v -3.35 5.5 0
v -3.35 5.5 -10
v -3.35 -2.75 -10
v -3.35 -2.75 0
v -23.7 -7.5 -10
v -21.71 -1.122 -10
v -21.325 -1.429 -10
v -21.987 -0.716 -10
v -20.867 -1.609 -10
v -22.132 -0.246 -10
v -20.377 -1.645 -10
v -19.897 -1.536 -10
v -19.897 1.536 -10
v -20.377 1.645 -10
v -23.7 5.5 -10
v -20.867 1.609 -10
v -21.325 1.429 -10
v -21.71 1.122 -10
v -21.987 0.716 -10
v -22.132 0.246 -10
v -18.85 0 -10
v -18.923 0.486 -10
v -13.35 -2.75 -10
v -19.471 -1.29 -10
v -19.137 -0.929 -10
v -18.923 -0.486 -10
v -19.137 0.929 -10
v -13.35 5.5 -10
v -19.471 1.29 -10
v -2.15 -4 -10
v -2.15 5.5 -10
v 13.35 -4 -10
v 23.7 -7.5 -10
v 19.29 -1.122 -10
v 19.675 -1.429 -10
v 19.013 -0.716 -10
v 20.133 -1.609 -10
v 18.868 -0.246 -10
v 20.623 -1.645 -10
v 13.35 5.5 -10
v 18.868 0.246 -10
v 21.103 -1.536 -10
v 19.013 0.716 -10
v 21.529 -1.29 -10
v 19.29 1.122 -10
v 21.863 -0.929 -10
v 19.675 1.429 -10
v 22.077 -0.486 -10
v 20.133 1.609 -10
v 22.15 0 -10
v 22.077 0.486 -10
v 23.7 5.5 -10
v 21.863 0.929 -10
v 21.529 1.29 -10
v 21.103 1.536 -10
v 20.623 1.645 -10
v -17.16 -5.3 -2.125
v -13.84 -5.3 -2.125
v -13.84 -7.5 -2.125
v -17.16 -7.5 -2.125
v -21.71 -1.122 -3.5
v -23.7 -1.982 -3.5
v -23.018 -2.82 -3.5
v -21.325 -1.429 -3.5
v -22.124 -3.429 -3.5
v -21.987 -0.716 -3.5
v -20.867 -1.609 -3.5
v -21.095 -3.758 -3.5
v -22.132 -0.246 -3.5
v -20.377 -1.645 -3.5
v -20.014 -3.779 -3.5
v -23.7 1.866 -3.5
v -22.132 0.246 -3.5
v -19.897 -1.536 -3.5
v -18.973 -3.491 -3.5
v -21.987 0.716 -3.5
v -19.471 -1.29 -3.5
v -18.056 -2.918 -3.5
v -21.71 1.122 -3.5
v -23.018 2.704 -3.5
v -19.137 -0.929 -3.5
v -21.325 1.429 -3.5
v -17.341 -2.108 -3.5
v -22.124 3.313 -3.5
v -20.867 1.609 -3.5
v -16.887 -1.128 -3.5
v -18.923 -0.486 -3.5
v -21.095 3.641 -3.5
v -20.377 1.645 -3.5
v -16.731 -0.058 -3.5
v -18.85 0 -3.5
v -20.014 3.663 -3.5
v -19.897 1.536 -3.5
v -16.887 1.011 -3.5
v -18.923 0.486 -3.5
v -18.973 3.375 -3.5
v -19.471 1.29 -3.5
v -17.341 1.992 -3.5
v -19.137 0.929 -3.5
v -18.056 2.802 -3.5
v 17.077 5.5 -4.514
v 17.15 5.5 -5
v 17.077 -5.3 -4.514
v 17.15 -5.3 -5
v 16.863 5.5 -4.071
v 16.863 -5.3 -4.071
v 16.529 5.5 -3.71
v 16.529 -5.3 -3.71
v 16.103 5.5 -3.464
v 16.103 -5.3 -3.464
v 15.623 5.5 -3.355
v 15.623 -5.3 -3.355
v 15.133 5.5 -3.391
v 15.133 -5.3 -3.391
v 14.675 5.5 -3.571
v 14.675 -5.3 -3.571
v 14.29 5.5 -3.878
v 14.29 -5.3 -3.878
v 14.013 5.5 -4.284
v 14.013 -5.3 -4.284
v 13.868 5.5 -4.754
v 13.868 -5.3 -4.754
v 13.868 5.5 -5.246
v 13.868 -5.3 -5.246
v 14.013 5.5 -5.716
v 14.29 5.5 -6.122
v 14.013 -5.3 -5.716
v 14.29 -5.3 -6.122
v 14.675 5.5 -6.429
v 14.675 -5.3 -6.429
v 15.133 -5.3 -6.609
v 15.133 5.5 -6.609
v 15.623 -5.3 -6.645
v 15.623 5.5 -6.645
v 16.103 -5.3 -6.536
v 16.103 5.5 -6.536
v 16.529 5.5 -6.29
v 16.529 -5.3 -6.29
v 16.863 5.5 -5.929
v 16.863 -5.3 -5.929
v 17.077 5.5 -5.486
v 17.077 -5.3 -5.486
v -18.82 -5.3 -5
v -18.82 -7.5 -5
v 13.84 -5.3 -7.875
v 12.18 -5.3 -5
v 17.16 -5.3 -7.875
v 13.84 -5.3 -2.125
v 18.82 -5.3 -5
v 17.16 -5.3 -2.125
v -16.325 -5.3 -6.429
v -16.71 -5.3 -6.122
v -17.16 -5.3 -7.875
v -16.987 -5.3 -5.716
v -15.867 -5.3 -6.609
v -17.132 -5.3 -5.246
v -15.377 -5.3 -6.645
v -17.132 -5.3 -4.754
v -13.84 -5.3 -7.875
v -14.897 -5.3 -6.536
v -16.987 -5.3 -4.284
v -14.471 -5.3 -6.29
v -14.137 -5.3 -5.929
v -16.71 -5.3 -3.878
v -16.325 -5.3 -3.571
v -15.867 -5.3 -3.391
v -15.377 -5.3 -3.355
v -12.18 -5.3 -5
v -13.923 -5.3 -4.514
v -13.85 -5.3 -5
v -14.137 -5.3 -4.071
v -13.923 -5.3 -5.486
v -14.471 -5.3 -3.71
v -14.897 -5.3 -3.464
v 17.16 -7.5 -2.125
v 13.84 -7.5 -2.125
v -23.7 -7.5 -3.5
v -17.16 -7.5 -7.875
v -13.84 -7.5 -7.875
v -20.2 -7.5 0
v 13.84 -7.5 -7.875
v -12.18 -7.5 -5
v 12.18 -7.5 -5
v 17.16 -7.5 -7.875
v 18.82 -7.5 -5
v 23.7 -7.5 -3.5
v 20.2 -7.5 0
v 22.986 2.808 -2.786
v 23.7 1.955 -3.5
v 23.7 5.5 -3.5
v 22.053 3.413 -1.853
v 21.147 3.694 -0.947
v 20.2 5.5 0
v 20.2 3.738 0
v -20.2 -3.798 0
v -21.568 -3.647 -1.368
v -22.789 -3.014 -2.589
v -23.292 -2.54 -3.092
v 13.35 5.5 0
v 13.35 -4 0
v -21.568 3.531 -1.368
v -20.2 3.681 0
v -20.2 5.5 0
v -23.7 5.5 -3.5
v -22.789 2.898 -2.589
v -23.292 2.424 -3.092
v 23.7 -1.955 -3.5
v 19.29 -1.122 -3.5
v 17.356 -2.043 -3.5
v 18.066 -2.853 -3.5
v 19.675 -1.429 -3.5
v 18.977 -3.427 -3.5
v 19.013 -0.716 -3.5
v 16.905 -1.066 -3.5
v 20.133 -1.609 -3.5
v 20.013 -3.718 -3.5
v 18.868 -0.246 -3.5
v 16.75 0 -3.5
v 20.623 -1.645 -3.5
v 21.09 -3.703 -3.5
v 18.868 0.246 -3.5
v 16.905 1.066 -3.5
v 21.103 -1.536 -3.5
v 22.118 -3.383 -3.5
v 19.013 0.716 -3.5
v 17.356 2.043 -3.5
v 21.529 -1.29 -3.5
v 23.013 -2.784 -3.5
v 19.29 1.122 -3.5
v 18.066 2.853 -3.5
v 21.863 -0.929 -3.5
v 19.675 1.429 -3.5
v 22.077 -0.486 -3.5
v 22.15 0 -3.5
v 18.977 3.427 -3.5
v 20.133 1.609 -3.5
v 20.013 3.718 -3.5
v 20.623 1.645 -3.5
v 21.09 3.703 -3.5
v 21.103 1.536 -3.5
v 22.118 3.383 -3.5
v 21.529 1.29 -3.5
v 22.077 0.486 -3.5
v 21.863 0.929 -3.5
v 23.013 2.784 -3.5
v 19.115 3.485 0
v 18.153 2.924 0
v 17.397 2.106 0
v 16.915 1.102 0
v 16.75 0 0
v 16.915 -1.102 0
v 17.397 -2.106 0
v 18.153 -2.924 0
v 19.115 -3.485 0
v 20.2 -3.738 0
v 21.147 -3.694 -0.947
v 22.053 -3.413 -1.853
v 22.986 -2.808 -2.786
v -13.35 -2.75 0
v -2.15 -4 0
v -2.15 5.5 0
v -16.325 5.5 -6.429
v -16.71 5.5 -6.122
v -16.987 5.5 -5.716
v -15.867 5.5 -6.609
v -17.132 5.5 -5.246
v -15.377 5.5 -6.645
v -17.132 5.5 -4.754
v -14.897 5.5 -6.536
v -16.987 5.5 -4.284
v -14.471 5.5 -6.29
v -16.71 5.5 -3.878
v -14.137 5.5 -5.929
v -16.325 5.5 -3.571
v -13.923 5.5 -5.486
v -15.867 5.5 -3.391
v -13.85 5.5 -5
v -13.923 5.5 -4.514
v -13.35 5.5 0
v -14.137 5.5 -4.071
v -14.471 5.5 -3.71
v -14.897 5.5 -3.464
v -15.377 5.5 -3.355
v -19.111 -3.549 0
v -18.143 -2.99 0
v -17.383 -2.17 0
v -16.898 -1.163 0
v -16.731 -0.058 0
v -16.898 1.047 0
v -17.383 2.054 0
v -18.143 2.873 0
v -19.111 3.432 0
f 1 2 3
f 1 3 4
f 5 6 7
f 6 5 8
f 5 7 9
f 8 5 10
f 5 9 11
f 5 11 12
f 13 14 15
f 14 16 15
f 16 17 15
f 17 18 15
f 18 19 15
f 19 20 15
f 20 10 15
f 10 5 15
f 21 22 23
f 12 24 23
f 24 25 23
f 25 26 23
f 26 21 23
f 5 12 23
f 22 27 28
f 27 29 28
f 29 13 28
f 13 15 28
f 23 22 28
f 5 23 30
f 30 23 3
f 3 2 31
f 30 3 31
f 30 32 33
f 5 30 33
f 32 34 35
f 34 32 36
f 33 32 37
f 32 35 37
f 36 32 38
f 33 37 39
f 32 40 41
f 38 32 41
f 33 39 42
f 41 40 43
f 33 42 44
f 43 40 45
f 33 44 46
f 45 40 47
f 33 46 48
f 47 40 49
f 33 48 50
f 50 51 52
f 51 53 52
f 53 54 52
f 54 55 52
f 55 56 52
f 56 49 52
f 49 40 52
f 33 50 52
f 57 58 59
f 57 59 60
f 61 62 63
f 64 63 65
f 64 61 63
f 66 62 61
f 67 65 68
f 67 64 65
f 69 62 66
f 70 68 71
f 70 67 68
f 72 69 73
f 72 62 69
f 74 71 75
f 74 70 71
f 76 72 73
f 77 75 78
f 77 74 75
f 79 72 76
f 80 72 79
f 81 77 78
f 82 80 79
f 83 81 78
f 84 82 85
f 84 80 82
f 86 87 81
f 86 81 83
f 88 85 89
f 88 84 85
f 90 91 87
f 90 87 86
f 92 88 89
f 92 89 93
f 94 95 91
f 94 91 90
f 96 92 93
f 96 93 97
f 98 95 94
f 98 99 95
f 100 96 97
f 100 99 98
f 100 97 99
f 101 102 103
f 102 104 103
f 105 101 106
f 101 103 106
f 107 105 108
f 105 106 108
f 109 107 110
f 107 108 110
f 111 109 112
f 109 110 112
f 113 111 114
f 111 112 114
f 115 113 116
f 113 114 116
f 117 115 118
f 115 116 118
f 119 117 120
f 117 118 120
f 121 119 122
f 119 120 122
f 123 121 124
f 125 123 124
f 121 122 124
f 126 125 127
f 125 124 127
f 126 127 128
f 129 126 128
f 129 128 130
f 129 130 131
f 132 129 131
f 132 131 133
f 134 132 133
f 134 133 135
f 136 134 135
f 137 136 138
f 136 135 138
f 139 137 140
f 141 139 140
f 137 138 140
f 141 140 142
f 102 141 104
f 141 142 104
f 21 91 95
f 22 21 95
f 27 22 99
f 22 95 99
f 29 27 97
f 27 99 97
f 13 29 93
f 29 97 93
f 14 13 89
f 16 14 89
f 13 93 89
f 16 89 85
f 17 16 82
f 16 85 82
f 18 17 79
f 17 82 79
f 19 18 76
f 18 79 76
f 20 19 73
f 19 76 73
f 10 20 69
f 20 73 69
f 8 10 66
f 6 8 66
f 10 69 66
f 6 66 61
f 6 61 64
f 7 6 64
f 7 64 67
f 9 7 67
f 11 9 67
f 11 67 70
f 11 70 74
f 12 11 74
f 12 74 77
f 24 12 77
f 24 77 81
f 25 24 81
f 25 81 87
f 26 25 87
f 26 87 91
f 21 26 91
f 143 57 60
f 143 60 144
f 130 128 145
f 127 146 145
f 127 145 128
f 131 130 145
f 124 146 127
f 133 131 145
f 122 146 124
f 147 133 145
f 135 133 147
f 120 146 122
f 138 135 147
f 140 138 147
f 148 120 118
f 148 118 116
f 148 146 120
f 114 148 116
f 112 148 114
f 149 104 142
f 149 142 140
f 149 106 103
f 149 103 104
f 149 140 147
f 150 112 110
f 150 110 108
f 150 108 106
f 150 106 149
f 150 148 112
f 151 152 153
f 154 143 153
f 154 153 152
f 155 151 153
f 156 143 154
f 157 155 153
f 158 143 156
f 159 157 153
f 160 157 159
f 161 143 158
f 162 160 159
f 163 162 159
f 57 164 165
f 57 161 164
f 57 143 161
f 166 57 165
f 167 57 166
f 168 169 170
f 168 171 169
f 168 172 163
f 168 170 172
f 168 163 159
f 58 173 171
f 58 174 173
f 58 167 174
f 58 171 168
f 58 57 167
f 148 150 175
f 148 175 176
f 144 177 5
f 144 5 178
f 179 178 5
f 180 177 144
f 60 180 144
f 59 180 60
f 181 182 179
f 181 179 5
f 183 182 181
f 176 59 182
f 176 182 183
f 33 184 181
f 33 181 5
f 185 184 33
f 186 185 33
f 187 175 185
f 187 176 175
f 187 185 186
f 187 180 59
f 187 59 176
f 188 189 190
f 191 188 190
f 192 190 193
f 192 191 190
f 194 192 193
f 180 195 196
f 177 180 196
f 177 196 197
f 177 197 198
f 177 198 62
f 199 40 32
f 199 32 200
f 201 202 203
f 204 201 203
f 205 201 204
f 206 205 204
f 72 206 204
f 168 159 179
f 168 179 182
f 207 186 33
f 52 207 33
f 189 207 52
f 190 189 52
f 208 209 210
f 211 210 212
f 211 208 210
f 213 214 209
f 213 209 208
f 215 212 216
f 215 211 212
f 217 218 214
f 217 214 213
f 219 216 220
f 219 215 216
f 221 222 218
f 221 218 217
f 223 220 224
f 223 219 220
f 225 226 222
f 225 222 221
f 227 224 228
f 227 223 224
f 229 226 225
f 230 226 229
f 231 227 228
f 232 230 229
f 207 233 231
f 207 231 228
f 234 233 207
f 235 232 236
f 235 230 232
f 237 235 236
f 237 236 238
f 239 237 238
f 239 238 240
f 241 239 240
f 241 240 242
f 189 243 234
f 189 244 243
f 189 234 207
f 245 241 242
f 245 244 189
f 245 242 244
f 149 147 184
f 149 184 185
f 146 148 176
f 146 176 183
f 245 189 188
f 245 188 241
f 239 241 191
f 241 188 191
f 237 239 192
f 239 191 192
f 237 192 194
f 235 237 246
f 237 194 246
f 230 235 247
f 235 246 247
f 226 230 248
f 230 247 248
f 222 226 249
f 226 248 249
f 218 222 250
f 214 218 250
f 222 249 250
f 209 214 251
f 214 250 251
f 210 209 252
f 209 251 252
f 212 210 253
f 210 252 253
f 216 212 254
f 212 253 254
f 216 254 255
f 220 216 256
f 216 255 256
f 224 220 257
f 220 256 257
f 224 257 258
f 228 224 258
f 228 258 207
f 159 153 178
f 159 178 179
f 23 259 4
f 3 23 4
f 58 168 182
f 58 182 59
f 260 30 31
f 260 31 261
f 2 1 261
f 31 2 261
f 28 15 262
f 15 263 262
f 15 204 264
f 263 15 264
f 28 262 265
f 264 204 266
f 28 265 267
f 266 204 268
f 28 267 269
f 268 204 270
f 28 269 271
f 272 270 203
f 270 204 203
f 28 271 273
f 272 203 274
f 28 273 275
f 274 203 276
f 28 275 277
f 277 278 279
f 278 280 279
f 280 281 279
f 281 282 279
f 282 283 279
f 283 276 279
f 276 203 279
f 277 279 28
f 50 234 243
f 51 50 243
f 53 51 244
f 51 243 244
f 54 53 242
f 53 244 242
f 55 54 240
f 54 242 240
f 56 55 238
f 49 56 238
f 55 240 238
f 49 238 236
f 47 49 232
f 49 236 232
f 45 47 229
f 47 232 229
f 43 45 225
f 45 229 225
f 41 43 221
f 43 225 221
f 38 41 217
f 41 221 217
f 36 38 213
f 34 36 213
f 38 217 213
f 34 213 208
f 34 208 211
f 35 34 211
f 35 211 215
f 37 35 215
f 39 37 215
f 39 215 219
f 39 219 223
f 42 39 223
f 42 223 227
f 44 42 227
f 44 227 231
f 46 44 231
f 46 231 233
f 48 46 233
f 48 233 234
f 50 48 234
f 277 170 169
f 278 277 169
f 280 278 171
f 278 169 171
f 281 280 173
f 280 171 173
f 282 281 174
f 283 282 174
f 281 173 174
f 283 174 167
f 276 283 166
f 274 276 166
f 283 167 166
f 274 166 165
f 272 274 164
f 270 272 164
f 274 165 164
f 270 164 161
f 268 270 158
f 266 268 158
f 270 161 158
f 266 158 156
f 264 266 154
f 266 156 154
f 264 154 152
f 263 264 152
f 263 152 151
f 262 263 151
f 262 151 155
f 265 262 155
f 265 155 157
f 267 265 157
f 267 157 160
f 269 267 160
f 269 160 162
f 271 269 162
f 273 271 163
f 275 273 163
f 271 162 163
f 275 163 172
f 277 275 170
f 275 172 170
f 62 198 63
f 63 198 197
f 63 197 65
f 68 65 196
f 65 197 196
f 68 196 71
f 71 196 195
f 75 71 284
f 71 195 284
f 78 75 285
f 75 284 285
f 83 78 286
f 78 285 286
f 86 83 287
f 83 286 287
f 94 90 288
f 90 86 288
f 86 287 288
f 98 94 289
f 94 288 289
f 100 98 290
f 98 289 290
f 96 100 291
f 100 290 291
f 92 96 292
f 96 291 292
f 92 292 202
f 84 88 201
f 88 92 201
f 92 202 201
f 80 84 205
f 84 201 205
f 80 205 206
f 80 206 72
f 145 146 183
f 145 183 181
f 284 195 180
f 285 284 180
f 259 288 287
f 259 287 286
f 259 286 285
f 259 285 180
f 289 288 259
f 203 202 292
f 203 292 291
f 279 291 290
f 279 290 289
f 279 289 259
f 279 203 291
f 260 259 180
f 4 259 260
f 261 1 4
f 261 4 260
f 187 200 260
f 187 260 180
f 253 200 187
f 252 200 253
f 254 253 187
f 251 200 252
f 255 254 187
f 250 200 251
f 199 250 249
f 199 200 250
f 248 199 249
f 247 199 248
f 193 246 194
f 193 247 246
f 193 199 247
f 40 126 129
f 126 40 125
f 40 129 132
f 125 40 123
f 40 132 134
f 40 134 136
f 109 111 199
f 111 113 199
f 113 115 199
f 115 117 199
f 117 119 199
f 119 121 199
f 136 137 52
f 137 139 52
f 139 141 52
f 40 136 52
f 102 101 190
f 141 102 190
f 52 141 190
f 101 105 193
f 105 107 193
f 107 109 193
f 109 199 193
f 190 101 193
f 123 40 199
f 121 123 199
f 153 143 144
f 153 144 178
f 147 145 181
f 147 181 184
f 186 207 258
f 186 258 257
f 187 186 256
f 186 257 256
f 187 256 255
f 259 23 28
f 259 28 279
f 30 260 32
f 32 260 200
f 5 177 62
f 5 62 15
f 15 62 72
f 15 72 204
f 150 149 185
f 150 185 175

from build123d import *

# Parameters (mm, degrees)
SKETCH_W             = 47.4
SKETCH_H             = 13
SKETCH_R             = 1.65
PAD_DEPTH            = 10
SKETCH001_R          = 3.75
POCKET_DEPTH         = 3.5
SKETCH002_W          = 15.5
SKETCH002_H          = 10
POCKET001_DEPTH      = 100
POCKET001_DEPTH_BACK = -4
SKETCH003_R          = 1.65
POCKET002_DEPTH      = 5.501
POCKET002_DEPTH_BACK = -7.501
POCKET003_DEPTH      = 5.501
POCKET003_DEPTH_BACK = -7.501
POCKET004_DEPTH      = 2.201
SKETCH006_W          = 10
SKETCH006_H          = 10
POCKET005_DEPTH      = 100
POCKET005_DEPTH_BACK = -2.75


with BuildPart() as part:
    # Sketch → Pad (new body)
    with BuildSketch(Plane.XY):
        with Locations((0, -1)):
            Rectangle(SKETCH_W, SKETCH_H)
        with Locations((-20.5, 0)):
            Circle(SKETCH_R, mode=Mode.SUBTRACT)
        with Locations((20.5, 0)):
            Circle(SKETCH_R, mode=Mode.SUBTRACT)
    extrude(amount=-PAD_DEPTH)

    # Sketch001 → Pocket (cut)
    with BuildSketch(Plane.XY):
        with Locations((-20.481411, -0.058129)):
            Circle(SKETCH001_R)
        with Locations((20.5, 0)):
            Circle(SKETCH001_R)
    extrude(amount=-POCKET_DEPTH, mode=Mode.SUBTRACT)

    # Sketch002 → Pocket001 (cut, two sides)
    with BuildSketch(Plane.XZ) as pocket001_sk:
        with Locations((5.6, -5)):
            Rectangle(SKETCH002_W, SKETCH002_H)
    extrude(amount=-POCKET001_DEPTH, mode=Mode.SUBTRACT)
    extrude(pocket001_sk.sketch, amount=-POCKET001_DEPTH_BACK, mode=Mode.SUBTRACT)

    # Sketch003 → Pocket002 (cut, two sides)
    with BuildSketch(Plane.XZ) as pocket002_sk:
        with Locations((-15.5, -5)):
            Circle(SKETCH003_R)
        with Locations((15.5, -5)):
            Circle(SKETCH003_R)
    extrude(amount=-POCKET002_DEPTH, mode=Mode.SUBTRACT)
    extrude(pocket002_sk.sketch, amount=-POCKET002_DEPTH_BACK, mode=Mode.SUBTRACT)

    # Sketch004 → Pocket003 (cut, two sides)
    with BuildSketch(Plane.XZ) as pocket003_sk:
        Polygon((-20.2, 0), (-23.7, -3.5), (-23.7, 0), align=None)
        Polygon((20.2, 0), (23.7, 0), (23.7, -3.5), align=None)
    extrude(amount=-POCKET003_DEPTH, mode=Mode.SUBTRACT)
    extrude(pocket003_sk.sketch, amount=-POCKET003_DEPTH_BACK, mode=Mode.SUBTRACT)

    # Sketch005 (on DatumPlane) → Pocket004 (cut, through all)
    with BuildSketch(Plane.XZ.offset(5.3)):
        Polygon((-13.840118, -7.875), (-12.180236, -5), (-13.840118, -2.125), (-17.159882, -2.125), (-18.819764, -5), (-17.159882, -7.875), align=None)
        Polygon((17.159882, -7.875), (18.819764, -5), (17.159882, -2.125), (13.840118, -2.125), (12.180236, -5), (13.840118, -7.875), align=None)
    extrude(amount=POCKET004_DEPTH, mode=Mode.SUBTRACT)

    # Sketch006 → Pocket005 (cut, two sides)
    with BuildSketch(Plane.XZ) as pocket005_sk:
        with Locations((-8.35, -5)):
            Rectangle(SKETCH006_W, SKETCH006_H)
    extrude(amount=-POCKET005_DEPTH, mode=Mode.SUBTRACT)
    extrude(pocket005_sk.sketch, amount=-POCKET005_DEPTH_BACK, mode=Mode.SUBTRACT)


solid = part.part
